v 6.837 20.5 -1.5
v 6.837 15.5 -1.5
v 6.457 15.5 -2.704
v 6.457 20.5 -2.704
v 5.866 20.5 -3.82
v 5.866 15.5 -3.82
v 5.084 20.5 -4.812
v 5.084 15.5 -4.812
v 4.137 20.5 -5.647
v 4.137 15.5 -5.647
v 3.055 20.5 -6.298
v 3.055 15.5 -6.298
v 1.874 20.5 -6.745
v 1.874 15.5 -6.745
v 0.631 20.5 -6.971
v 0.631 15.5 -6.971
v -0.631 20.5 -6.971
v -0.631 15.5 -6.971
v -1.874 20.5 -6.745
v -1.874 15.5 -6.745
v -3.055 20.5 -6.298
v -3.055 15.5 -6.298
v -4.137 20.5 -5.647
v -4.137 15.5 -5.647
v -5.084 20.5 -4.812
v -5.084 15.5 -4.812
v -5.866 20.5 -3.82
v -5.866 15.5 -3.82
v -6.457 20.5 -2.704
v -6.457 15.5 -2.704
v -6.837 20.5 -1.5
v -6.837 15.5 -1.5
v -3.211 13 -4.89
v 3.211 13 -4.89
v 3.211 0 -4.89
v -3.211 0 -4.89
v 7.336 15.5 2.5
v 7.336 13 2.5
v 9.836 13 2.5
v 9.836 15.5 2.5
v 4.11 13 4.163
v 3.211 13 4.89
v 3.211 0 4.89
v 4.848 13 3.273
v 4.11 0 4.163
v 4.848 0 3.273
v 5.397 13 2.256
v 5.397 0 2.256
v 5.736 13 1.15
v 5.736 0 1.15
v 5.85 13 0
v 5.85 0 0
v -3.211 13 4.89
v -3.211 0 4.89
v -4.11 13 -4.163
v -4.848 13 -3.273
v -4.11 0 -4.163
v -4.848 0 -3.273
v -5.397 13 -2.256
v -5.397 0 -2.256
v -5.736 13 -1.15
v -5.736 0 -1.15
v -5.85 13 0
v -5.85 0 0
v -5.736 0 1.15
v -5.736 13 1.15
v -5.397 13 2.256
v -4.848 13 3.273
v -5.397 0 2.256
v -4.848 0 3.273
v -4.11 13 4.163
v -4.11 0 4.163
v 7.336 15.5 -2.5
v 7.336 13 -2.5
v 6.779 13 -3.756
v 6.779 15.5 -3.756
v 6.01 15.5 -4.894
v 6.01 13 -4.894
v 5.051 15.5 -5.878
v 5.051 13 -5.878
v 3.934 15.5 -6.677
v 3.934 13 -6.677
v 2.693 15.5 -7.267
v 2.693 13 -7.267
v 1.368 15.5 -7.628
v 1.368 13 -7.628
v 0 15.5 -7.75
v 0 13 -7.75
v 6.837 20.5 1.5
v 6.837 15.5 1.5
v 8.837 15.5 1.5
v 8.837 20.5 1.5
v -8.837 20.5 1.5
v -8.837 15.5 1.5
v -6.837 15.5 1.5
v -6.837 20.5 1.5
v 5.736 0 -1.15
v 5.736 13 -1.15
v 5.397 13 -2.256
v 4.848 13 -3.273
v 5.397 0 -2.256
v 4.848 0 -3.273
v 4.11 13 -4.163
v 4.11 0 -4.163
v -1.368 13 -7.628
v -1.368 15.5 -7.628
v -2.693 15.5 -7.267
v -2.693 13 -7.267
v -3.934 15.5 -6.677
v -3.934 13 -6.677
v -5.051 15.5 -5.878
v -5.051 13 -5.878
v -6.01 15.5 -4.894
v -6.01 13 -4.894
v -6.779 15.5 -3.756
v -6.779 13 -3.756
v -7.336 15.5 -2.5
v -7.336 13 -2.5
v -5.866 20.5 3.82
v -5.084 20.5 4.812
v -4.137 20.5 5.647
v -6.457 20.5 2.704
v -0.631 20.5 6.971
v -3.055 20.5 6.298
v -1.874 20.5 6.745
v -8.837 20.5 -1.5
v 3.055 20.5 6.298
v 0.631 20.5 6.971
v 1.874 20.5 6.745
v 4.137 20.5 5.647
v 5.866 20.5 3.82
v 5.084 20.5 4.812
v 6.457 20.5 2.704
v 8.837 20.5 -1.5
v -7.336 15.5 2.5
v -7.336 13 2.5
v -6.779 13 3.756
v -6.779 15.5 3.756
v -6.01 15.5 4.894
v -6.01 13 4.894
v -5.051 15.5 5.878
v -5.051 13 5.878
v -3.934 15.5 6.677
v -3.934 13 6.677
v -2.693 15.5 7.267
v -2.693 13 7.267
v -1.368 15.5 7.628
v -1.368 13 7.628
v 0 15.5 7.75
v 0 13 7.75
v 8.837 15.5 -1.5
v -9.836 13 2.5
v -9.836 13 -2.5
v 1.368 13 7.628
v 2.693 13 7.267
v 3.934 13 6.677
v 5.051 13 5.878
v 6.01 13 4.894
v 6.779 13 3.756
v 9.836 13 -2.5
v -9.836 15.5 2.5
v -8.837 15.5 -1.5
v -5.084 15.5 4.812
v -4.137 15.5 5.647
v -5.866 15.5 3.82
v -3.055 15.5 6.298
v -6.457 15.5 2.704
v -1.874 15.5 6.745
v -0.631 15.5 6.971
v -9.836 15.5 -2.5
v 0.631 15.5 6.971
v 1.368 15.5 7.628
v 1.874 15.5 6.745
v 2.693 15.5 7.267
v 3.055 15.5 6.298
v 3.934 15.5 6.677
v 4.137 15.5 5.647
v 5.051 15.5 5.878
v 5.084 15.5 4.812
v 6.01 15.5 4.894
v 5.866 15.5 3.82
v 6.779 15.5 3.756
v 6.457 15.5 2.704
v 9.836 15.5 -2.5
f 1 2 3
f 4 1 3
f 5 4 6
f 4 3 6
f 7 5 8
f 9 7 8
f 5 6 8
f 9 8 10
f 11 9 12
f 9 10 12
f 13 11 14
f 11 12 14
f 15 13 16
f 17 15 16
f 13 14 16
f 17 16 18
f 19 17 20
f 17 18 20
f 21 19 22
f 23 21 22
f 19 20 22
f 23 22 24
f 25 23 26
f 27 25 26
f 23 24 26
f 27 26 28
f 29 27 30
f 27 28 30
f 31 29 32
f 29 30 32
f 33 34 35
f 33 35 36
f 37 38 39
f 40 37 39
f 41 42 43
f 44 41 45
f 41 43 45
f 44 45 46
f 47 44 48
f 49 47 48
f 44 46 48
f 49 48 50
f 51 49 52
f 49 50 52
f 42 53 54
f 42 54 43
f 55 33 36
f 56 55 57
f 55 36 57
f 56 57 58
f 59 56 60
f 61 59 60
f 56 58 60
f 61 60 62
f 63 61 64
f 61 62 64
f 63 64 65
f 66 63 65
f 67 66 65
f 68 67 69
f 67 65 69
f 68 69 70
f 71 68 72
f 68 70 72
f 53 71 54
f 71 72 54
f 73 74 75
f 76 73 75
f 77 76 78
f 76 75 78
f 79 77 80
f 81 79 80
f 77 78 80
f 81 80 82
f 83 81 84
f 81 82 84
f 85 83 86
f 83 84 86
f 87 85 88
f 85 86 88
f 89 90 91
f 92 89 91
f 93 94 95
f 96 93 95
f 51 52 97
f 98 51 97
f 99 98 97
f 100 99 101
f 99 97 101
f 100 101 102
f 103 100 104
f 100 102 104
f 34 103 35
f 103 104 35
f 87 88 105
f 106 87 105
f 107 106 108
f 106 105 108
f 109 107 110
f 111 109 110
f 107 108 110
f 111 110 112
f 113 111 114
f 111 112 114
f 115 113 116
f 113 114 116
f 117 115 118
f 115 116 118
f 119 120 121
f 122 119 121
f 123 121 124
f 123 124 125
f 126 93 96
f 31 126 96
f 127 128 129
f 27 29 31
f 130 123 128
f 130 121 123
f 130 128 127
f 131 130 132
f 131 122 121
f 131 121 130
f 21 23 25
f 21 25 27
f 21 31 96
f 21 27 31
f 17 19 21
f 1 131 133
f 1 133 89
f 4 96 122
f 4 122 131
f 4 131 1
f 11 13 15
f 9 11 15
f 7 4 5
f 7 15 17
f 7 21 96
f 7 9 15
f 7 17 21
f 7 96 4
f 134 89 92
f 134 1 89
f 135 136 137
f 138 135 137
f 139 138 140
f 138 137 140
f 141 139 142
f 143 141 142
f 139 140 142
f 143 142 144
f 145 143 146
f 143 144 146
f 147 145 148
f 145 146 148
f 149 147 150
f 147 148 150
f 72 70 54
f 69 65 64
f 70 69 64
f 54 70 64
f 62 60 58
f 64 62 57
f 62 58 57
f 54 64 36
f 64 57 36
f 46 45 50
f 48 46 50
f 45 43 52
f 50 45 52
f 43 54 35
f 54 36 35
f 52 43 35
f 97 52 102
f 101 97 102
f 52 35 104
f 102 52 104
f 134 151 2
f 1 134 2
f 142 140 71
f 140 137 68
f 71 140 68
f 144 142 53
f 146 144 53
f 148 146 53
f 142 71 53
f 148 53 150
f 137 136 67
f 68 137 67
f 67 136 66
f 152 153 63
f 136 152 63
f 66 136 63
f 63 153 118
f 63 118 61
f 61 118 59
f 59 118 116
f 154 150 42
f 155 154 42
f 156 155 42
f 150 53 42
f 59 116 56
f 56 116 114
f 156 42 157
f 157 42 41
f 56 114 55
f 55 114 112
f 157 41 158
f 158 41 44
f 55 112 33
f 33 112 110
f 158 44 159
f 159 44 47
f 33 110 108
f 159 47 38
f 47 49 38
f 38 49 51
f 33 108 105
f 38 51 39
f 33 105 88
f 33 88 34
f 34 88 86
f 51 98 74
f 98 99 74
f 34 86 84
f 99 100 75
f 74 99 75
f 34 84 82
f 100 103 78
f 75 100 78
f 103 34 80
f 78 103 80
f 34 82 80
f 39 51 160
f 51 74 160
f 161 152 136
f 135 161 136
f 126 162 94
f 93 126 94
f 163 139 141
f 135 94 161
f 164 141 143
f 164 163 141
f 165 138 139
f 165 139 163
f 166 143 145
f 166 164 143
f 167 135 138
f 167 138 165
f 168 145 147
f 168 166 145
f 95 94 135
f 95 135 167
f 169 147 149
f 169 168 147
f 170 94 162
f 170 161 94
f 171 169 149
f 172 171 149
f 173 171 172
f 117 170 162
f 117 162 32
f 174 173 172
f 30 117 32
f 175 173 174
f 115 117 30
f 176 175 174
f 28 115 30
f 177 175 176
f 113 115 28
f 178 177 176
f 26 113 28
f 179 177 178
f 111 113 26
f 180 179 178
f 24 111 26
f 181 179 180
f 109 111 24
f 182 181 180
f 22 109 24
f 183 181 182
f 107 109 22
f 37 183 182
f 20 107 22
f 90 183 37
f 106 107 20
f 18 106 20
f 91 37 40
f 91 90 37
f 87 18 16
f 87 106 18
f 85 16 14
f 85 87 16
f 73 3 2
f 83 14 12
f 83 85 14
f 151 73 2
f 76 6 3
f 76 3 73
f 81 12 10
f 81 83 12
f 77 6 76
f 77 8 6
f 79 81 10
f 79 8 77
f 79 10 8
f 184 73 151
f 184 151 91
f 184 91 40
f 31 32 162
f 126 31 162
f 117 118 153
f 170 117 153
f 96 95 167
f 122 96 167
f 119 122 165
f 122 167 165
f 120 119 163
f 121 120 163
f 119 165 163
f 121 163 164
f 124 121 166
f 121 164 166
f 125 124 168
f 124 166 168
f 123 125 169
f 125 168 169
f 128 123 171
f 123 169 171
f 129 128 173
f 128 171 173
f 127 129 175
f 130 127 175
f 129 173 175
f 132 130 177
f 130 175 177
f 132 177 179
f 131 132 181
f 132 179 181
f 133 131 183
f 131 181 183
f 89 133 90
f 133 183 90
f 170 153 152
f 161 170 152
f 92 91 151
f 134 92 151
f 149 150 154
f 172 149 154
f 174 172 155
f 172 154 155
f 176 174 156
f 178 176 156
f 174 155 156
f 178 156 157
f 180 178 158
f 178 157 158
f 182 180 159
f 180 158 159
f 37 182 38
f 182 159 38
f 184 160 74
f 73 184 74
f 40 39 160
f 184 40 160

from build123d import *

# Parameters (mm, degrees)
BOSS_EXTRUDE1_DEPTH = 13
BOSS_EXTRUDE2_DEPTH = 2.5
SKETCH3_R           = 7
BOSS_EXTRUDE3_DEPTH = 5


with BuildPart() as part:
    # Sketch1 → Boss-Extrude1 (new body)
    with BuildSketch(Plane(origin=(0, 0, 0), x_dir=(1, 0, 0), z_dir=(0, 1, 0))):
        with BuildLine():
            ThreePointArc((5.85, 0), (5.148142373, 2.778332254), (3.210981158, 4.89))
            Line((3.210981158, 4.89), (-3.210981158, 4.89))
            ThreePointArc((-3.210981158, 4.89), (-5.148142373, 2.778332254), (-5.85, 0))
            Line((-5.85, 0), (5.85, 0))
        make_face()
        with BuildLine():
            ThreePointArc((3.210981158, -4.89), (5.148142373, -2.778332254), (5.85, 0))
            Line((5.85, 0), (-5.85, 0))
            ThreePointArc((-5.85, 0), (-5.148142373, -2.778332254), (-3.210981158, -4.89))
            Line((-3.210981158, -4.89), (3.210981158, -4.89))
        make_face()
    extrude(amount=BOSS_EXTRUDE1_DEPTH)

    # Sketch2 → Boss-Extrude2 (add)
    with BuildSketch(Plane(origin=(0, 13, 0), x_dir=(1, 0, 0), z_dir=(0, 1, 0))):
        with BuildLine():
            Line((0, 4.89), (0, 7.75))
            ThreePointArc((0, 7.75), (-4.510404638, 6.302281333), (-7.335700376, 2.5))
            ThreePointArc((-7.335700376, 2.5), (-7.75, 0), (-7.335700376, -2.5))
            ThreePointArc((-7.335700376, -2.5), (-4.510404638, -6.302281333), (0, -7.75))
            Line((0, -7.75), (0, -4.89))
            Line((0, -4.89), (-3.210981158, -4.89))
            ThreePointArc((-3.210981158, -4.89), (-5.85, 0), (-3.210981158, 4.89))
            Line((-3.210981158, 4.89), (0, 4.89))
        make_face()
        with BuildLine():
            ThreePointArc((7.335700376, 2.5), (4.510404638, 6.302281333), (0, 7.75))
            Line((0, 7.75), (0, 4.89))
            Line((0, 4.89), (3.210981158, 4.89))
            ThreePointArc((3.210981158, 4.89), (5.85, 0), (3.210981158, -4.89))
            Line((3.210981158, -4.89), (0, -4.89))
            Line((0, -4.89), (0, -7.75))
            ThreePointArc((0, -7.75), (4.510404638, -6.302281333), (7.335700376, -2.5))
            ThreePointArc((7.335700376, -2.5), (7.645723573, -1.267048162), (7.75, 0))
            ThreePointArc((7.75, 0), (7.645723573, 1.267048162), (7.335700376, 2.5))
        make_face()
        with BuildLine():
            Line((3.210981158, 4.89), (0, 4.89))
            Line((0, 4.89), (0, -4.89))
            Line((0, -4.89), (3.210981158, -4.89))
            ThreePointArc((3.210981158, -4.89), (5.85, 0), (3.210981158, 4.89))
        make_face()
        with BuildLine():
            Line((9.835700376, 2.5), (7.335700376, 2.5))
            ThreePointArc((7.335700376, 2.5), (7.645723573, 1.267048162), (7.75, 0))
            ThreePointArc((7.75, 0), (7.645723573, -1.267048162), (7.335700376, -2.5))
            Line((7.335700376, -2.5), (9.835700376, -2.5))
            Line((9.835700376, -2.5), (9.835700376, 2.5))
        make_face()
        with BuildLine():
            Line((0, -4.89), (0, 4.89))
            Line((0, 4.89), (-3.210981158, 4.89))
            ThreePointArc((-3.210981158, 4.89), (-5.85, 0), (-3.210981158, -4.89))
            Line((-3.210981158, -4.89), (0, -4.89))
        make_face()
        with BuildLine():
            ThreePointArc((-7.335700376, -2.5), (-7.75, 0), (-7.335700376, 2.5))
            Line((-7.335700376, 2.5), (-9.835700376, 2.5))
            Line((-9.835700376, 2.5), (-9.835700376, -2.5))
            Line((-9.835700376, -2.5), (-7.335700376, -2.5))
        make_face()
    extrude(amount=BOSS_EXTRUDE2_DEPTH)

    # Sketch3 → Boss-Extrude3 (add)
    with BuildSketch(Plane(origin=(0, 15.5, 0), x_dir=(1, 0, 0), z_dir=(0, 1, 0))):
        Circle(SKETCH3_R)
        with BuildLine():
            ThreePointArc((-6.837397166, -1.5), (-7, 0), (-6.837397166, 1.5))
            Line((-6.837397166, 1.5), (-8.837397166, 1.5))
            Line((-8.837397166, 1.5), (-8.837397166, -1.5))
            Line((-8.837397166, -1.5), (-6.837397166, -1.5))
        make_face()
        with BuildLine():
            Line((8.837397166, 1.5), (6.837397166, 1.5))
            ThreePointArc((6.837397166, 1.5), (6.959230567, 0.754393744), (7, 0))
            ThreePointArc((7, 0), (6.959230567, -0.754393744), (6.837397166, -1.5))
            Line((6.837397166, -1.5), (8.837397166, -1.5))
            Line((8.837397166, -1.5), (8.837397166, 1.5))
        make_face()
    extrude(amount=BOSS_EXTRUDE3_DEPTH)


solid = part.part
